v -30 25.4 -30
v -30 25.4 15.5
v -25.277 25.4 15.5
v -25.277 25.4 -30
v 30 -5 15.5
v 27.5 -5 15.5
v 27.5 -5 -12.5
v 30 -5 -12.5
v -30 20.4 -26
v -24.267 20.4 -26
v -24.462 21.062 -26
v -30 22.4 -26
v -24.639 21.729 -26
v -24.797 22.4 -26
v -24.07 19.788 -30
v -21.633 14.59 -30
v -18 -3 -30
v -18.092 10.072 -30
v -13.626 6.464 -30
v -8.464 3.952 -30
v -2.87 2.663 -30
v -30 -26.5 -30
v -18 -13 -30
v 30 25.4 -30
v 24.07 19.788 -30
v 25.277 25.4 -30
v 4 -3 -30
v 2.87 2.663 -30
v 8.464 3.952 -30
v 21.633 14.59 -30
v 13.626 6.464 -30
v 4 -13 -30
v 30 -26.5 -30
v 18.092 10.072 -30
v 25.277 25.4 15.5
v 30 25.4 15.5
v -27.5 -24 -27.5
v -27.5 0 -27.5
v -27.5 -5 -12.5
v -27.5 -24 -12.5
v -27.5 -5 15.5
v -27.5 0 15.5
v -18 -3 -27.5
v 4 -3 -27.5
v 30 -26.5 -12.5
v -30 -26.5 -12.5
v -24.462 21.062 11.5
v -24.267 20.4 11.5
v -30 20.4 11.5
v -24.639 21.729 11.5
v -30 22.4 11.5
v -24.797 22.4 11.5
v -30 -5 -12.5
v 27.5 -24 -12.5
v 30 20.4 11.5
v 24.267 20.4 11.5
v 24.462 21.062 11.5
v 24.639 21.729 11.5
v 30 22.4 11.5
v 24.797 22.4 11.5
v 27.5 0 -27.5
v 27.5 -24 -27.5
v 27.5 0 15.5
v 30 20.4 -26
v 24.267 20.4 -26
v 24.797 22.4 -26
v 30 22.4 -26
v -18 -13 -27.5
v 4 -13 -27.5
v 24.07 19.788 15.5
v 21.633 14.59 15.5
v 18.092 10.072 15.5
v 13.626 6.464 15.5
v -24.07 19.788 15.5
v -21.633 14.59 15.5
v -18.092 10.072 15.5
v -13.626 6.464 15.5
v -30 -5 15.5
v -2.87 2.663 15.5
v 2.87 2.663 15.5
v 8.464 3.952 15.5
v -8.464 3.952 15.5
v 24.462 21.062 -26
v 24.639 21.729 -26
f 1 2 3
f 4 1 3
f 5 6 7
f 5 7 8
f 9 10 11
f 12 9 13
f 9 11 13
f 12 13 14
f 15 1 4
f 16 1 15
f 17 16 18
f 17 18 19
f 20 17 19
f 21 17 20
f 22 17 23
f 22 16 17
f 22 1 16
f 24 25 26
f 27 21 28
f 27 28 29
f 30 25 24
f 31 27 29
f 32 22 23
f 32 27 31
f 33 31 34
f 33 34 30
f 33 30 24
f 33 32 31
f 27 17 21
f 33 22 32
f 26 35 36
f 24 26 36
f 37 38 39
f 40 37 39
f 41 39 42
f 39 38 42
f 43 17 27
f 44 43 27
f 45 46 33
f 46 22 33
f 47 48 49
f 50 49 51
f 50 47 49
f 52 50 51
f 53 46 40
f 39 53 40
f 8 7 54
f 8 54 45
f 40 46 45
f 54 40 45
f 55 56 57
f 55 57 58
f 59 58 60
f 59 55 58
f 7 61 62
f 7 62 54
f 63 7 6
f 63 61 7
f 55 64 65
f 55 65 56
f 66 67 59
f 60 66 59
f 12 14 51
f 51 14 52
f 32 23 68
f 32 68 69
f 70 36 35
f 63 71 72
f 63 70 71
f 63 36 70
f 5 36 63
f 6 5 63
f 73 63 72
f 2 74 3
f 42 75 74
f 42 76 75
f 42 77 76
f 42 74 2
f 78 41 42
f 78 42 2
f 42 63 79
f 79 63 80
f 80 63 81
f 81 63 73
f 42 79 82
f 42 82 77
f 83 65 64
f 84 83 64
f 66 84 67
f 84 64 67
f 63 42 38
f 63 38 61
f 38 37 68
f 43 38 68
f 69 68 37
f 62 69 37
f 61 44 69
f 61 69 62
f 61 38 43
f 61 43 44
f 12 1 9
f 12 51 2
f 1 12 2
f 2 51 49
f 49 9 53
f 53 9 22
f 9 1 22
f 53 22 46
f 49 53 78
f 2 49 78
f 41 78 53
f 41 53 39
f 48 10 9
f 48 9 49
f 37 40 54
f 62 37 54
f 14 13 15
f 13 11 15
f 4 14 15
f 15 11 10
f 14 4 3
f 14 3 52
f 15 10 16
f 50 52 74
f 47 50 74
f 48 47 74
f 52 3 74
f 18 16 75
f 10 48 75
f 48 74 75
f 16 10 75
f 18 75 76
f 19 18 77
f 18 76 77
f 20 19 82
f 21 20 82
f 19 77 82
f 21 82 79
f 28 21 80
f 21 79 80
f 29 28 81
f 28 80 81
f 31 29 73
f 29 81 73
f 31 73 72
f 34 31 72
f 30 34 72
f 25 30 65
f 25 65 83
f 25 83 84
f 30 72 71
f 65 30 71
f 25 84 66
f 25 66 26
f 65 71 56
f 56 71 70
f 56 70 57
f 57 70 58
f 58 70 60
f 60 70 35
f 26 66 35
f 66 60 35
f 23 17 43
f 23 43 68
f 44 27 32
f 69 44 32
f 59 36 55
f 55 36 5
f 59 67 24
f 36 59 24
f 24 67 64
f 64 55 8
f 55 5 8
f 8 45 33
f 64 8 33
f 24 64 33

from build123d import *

# Parameters (mm, degrees)
F0_W      = 55
F0_H      = 55
F1_DEPTH  = 24
F2_W      = 60
F2_H      = 29
F3_DEPTH  = 2.5
F4_DEPTH  = 15
F5_W      = 22
F5_H      = 10
F6_DEPTH  = 2.5
F7_W      = 2.5
F7_H      = 5
F8_DEPTH  = 28
F9_DEPTH  = 25.4
F11_DEPTH = 46
F12_W     = 2
F12_H     = 37.5
F13_DEPTH = 60
F14_DEPTH = 24


with BuildPart() as f1:
    # F0 (on Front) → F1 (new body)
    with BuildSketch(Plane.XZ):
        Rectangle(F0_W, F0_H)
    extrude(amount=F1_DEPTH)

    # F2 (on face) → F3 (join)
    with BuildSketch(Plane(origin=(0, 0, -27.5), x_dir=(1, 0, 0), z_dir=(0, 0, -1))):
        with Locations((0, 12)):
            Rectangle(F2_W, F2_H)
    extrude(amount=F3_DEPTH)

    # F2 (on face) → F4 (join)
    with BuildSketch(Plane(origin=(0, 0, -27.5), x_dir=(1, 0, 0), z_dir=(0, 0, -1))):
        with Locations((0, 12)):
            Rectangle(F2_W, F2_H)
    extrude(amount=-F4_DEPTH)

    # F5 (on face) → F6 (cut)
    with BuildSketch(Plane(origin=(0, 0, -30), x_dir=(1, 0, 0), z_dir=(0, 0, -1))):
        with Locations((-7, 8)):
            Rectangle(F5_W, F5_H)
    extrude(amount=-F6_DEPTH, mode=Mode.SUBTRACT)

    # F7 (on face) → F8 (join)
    with BuildSketch(Plane.XY.offset(-12.5)):
        Polygon((30, 2.5), (-30, 2.5), (-30, 0), (-27.5, 0), (27.5, 0), (30, 0), align=None)
        with Locations((-28.75, -2.5)):
            Rectangle(F7_W, F7_H)
        with Locations((28.75, -2.5)):
            Rectangle(F7_W, F7_H)
    extrude(amount=F8_DEPTH)

    # F9 (add): a face of the model
    f9_faces = [f1.faces().sort_by_distance(p)[0] for p in [
        (0, 2.5, -7.25),
    ]]
    extrude(f9_faces, amount=F9_DEPTH)

    # F10 (on face) → F11 (cut)
    with BuildSketch(Plane.XY.offset(15.5)):
        with BuildLine():
            Line((-25.4, 27.9), (25.4, 27.9))
            ThreePointArc((25.4, 27.9), (0, 53.3), (-25.4, 27.9))
        make_face()
        with BuildLine():
            Line((30, 27.9), (25.4, 27.9))
            ThreePointArc((25.4, 27.9), (25.3691485346, 26.6484798728), (25.2766690844, 25.4))
            Line((25.2766690844, 25.4), (30, 25.4))
            Line((30, 25.4), (30, 27.9))
        make_face()
        with BuildLine():
            ThreePointArc((25.2766690844, 25.4), (25.3691485346, 26.6484798728), (25.4, 27.9))
            Line((25.4, 27.9), (-25.4, 27.9))
            ThreePointArc((-25.4, 27.9), (-25.3691485346, 26.6484798728), (-25.2766690844, 25.4))
            Line((-25.2766690844, 25.4), (25.2766690844, 25.4))
        make_face()
        with BuildLine():
            ThreePointArc((-25.2766690844, 25.4), (-25.3691485346, 26.6484798728), (-25.4, 27.9))
            Line((-25.4, 27.9), (-30, 27.9))
            Line((-30, 27.9), (-30, 25.4))
            Line((-30, 25.4), (-25.2766690844, 25.4))
        make_face()
        with BuildLine():
            ThreePointArc((-25.2766690844, 25.4), (0, 2.5), (25.2766690844, 25.4))
            Line((25.2766690844, 25.4), (-25.2766690844, 25.4))
        make_face()
    extrude(amount=-F11_DEPTH, mode=Mode.SUBTRACT)

    # F12 (on face) → F13 (cut)
    with BuildSketch(Plane.YZ.offset(30)):
        with Locations((21.4, -7.25)):
            Rectangle(F12_W, F12_H)
    extrude(amount=-F13_DEPTH, mode=Mode.SUBTRACT)

    # F0 (on Front) → F14 (cut)
    with BuildSketch(Plane.XZ):
        Rectangle(F0_W, F0_H)
    extrude(amount=F14_DEPTH, mode=Mode.SUBTRACT)


solid = f1.part
